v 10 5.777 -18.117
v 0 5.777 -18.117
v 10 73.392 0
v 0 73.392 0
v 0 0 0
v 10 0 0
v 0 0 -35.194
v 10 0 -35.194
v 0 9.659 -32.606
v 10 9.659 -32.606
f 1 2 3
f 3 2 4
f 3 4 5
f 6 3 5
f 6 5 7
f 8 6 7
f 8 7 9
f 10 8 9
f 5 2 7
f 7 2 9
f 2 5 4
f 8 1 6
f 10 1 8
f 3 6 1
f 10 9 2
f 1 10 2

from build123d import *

# Parameters (mm, degrees)
BOSS_EXTRU_1_DEPTH = 10


with BuildPart() as part:
    # Esquisse1 → Boss.-Extru.1 (new body)
    with BuildSketch(Plane(origin=(0, 0, 0), x_dir=(0, 0, -1), z_dir=(1, 0, 0))):
        Polygon((0, 0), (35.194411003, 0), (32.606220552, 9.659258263), (18.117333157, 5.776972586), (0, 73.391780427), align=None)
    extrude(amount=BOSS_EXTRU_1_DEPTH)


solid = part.part
